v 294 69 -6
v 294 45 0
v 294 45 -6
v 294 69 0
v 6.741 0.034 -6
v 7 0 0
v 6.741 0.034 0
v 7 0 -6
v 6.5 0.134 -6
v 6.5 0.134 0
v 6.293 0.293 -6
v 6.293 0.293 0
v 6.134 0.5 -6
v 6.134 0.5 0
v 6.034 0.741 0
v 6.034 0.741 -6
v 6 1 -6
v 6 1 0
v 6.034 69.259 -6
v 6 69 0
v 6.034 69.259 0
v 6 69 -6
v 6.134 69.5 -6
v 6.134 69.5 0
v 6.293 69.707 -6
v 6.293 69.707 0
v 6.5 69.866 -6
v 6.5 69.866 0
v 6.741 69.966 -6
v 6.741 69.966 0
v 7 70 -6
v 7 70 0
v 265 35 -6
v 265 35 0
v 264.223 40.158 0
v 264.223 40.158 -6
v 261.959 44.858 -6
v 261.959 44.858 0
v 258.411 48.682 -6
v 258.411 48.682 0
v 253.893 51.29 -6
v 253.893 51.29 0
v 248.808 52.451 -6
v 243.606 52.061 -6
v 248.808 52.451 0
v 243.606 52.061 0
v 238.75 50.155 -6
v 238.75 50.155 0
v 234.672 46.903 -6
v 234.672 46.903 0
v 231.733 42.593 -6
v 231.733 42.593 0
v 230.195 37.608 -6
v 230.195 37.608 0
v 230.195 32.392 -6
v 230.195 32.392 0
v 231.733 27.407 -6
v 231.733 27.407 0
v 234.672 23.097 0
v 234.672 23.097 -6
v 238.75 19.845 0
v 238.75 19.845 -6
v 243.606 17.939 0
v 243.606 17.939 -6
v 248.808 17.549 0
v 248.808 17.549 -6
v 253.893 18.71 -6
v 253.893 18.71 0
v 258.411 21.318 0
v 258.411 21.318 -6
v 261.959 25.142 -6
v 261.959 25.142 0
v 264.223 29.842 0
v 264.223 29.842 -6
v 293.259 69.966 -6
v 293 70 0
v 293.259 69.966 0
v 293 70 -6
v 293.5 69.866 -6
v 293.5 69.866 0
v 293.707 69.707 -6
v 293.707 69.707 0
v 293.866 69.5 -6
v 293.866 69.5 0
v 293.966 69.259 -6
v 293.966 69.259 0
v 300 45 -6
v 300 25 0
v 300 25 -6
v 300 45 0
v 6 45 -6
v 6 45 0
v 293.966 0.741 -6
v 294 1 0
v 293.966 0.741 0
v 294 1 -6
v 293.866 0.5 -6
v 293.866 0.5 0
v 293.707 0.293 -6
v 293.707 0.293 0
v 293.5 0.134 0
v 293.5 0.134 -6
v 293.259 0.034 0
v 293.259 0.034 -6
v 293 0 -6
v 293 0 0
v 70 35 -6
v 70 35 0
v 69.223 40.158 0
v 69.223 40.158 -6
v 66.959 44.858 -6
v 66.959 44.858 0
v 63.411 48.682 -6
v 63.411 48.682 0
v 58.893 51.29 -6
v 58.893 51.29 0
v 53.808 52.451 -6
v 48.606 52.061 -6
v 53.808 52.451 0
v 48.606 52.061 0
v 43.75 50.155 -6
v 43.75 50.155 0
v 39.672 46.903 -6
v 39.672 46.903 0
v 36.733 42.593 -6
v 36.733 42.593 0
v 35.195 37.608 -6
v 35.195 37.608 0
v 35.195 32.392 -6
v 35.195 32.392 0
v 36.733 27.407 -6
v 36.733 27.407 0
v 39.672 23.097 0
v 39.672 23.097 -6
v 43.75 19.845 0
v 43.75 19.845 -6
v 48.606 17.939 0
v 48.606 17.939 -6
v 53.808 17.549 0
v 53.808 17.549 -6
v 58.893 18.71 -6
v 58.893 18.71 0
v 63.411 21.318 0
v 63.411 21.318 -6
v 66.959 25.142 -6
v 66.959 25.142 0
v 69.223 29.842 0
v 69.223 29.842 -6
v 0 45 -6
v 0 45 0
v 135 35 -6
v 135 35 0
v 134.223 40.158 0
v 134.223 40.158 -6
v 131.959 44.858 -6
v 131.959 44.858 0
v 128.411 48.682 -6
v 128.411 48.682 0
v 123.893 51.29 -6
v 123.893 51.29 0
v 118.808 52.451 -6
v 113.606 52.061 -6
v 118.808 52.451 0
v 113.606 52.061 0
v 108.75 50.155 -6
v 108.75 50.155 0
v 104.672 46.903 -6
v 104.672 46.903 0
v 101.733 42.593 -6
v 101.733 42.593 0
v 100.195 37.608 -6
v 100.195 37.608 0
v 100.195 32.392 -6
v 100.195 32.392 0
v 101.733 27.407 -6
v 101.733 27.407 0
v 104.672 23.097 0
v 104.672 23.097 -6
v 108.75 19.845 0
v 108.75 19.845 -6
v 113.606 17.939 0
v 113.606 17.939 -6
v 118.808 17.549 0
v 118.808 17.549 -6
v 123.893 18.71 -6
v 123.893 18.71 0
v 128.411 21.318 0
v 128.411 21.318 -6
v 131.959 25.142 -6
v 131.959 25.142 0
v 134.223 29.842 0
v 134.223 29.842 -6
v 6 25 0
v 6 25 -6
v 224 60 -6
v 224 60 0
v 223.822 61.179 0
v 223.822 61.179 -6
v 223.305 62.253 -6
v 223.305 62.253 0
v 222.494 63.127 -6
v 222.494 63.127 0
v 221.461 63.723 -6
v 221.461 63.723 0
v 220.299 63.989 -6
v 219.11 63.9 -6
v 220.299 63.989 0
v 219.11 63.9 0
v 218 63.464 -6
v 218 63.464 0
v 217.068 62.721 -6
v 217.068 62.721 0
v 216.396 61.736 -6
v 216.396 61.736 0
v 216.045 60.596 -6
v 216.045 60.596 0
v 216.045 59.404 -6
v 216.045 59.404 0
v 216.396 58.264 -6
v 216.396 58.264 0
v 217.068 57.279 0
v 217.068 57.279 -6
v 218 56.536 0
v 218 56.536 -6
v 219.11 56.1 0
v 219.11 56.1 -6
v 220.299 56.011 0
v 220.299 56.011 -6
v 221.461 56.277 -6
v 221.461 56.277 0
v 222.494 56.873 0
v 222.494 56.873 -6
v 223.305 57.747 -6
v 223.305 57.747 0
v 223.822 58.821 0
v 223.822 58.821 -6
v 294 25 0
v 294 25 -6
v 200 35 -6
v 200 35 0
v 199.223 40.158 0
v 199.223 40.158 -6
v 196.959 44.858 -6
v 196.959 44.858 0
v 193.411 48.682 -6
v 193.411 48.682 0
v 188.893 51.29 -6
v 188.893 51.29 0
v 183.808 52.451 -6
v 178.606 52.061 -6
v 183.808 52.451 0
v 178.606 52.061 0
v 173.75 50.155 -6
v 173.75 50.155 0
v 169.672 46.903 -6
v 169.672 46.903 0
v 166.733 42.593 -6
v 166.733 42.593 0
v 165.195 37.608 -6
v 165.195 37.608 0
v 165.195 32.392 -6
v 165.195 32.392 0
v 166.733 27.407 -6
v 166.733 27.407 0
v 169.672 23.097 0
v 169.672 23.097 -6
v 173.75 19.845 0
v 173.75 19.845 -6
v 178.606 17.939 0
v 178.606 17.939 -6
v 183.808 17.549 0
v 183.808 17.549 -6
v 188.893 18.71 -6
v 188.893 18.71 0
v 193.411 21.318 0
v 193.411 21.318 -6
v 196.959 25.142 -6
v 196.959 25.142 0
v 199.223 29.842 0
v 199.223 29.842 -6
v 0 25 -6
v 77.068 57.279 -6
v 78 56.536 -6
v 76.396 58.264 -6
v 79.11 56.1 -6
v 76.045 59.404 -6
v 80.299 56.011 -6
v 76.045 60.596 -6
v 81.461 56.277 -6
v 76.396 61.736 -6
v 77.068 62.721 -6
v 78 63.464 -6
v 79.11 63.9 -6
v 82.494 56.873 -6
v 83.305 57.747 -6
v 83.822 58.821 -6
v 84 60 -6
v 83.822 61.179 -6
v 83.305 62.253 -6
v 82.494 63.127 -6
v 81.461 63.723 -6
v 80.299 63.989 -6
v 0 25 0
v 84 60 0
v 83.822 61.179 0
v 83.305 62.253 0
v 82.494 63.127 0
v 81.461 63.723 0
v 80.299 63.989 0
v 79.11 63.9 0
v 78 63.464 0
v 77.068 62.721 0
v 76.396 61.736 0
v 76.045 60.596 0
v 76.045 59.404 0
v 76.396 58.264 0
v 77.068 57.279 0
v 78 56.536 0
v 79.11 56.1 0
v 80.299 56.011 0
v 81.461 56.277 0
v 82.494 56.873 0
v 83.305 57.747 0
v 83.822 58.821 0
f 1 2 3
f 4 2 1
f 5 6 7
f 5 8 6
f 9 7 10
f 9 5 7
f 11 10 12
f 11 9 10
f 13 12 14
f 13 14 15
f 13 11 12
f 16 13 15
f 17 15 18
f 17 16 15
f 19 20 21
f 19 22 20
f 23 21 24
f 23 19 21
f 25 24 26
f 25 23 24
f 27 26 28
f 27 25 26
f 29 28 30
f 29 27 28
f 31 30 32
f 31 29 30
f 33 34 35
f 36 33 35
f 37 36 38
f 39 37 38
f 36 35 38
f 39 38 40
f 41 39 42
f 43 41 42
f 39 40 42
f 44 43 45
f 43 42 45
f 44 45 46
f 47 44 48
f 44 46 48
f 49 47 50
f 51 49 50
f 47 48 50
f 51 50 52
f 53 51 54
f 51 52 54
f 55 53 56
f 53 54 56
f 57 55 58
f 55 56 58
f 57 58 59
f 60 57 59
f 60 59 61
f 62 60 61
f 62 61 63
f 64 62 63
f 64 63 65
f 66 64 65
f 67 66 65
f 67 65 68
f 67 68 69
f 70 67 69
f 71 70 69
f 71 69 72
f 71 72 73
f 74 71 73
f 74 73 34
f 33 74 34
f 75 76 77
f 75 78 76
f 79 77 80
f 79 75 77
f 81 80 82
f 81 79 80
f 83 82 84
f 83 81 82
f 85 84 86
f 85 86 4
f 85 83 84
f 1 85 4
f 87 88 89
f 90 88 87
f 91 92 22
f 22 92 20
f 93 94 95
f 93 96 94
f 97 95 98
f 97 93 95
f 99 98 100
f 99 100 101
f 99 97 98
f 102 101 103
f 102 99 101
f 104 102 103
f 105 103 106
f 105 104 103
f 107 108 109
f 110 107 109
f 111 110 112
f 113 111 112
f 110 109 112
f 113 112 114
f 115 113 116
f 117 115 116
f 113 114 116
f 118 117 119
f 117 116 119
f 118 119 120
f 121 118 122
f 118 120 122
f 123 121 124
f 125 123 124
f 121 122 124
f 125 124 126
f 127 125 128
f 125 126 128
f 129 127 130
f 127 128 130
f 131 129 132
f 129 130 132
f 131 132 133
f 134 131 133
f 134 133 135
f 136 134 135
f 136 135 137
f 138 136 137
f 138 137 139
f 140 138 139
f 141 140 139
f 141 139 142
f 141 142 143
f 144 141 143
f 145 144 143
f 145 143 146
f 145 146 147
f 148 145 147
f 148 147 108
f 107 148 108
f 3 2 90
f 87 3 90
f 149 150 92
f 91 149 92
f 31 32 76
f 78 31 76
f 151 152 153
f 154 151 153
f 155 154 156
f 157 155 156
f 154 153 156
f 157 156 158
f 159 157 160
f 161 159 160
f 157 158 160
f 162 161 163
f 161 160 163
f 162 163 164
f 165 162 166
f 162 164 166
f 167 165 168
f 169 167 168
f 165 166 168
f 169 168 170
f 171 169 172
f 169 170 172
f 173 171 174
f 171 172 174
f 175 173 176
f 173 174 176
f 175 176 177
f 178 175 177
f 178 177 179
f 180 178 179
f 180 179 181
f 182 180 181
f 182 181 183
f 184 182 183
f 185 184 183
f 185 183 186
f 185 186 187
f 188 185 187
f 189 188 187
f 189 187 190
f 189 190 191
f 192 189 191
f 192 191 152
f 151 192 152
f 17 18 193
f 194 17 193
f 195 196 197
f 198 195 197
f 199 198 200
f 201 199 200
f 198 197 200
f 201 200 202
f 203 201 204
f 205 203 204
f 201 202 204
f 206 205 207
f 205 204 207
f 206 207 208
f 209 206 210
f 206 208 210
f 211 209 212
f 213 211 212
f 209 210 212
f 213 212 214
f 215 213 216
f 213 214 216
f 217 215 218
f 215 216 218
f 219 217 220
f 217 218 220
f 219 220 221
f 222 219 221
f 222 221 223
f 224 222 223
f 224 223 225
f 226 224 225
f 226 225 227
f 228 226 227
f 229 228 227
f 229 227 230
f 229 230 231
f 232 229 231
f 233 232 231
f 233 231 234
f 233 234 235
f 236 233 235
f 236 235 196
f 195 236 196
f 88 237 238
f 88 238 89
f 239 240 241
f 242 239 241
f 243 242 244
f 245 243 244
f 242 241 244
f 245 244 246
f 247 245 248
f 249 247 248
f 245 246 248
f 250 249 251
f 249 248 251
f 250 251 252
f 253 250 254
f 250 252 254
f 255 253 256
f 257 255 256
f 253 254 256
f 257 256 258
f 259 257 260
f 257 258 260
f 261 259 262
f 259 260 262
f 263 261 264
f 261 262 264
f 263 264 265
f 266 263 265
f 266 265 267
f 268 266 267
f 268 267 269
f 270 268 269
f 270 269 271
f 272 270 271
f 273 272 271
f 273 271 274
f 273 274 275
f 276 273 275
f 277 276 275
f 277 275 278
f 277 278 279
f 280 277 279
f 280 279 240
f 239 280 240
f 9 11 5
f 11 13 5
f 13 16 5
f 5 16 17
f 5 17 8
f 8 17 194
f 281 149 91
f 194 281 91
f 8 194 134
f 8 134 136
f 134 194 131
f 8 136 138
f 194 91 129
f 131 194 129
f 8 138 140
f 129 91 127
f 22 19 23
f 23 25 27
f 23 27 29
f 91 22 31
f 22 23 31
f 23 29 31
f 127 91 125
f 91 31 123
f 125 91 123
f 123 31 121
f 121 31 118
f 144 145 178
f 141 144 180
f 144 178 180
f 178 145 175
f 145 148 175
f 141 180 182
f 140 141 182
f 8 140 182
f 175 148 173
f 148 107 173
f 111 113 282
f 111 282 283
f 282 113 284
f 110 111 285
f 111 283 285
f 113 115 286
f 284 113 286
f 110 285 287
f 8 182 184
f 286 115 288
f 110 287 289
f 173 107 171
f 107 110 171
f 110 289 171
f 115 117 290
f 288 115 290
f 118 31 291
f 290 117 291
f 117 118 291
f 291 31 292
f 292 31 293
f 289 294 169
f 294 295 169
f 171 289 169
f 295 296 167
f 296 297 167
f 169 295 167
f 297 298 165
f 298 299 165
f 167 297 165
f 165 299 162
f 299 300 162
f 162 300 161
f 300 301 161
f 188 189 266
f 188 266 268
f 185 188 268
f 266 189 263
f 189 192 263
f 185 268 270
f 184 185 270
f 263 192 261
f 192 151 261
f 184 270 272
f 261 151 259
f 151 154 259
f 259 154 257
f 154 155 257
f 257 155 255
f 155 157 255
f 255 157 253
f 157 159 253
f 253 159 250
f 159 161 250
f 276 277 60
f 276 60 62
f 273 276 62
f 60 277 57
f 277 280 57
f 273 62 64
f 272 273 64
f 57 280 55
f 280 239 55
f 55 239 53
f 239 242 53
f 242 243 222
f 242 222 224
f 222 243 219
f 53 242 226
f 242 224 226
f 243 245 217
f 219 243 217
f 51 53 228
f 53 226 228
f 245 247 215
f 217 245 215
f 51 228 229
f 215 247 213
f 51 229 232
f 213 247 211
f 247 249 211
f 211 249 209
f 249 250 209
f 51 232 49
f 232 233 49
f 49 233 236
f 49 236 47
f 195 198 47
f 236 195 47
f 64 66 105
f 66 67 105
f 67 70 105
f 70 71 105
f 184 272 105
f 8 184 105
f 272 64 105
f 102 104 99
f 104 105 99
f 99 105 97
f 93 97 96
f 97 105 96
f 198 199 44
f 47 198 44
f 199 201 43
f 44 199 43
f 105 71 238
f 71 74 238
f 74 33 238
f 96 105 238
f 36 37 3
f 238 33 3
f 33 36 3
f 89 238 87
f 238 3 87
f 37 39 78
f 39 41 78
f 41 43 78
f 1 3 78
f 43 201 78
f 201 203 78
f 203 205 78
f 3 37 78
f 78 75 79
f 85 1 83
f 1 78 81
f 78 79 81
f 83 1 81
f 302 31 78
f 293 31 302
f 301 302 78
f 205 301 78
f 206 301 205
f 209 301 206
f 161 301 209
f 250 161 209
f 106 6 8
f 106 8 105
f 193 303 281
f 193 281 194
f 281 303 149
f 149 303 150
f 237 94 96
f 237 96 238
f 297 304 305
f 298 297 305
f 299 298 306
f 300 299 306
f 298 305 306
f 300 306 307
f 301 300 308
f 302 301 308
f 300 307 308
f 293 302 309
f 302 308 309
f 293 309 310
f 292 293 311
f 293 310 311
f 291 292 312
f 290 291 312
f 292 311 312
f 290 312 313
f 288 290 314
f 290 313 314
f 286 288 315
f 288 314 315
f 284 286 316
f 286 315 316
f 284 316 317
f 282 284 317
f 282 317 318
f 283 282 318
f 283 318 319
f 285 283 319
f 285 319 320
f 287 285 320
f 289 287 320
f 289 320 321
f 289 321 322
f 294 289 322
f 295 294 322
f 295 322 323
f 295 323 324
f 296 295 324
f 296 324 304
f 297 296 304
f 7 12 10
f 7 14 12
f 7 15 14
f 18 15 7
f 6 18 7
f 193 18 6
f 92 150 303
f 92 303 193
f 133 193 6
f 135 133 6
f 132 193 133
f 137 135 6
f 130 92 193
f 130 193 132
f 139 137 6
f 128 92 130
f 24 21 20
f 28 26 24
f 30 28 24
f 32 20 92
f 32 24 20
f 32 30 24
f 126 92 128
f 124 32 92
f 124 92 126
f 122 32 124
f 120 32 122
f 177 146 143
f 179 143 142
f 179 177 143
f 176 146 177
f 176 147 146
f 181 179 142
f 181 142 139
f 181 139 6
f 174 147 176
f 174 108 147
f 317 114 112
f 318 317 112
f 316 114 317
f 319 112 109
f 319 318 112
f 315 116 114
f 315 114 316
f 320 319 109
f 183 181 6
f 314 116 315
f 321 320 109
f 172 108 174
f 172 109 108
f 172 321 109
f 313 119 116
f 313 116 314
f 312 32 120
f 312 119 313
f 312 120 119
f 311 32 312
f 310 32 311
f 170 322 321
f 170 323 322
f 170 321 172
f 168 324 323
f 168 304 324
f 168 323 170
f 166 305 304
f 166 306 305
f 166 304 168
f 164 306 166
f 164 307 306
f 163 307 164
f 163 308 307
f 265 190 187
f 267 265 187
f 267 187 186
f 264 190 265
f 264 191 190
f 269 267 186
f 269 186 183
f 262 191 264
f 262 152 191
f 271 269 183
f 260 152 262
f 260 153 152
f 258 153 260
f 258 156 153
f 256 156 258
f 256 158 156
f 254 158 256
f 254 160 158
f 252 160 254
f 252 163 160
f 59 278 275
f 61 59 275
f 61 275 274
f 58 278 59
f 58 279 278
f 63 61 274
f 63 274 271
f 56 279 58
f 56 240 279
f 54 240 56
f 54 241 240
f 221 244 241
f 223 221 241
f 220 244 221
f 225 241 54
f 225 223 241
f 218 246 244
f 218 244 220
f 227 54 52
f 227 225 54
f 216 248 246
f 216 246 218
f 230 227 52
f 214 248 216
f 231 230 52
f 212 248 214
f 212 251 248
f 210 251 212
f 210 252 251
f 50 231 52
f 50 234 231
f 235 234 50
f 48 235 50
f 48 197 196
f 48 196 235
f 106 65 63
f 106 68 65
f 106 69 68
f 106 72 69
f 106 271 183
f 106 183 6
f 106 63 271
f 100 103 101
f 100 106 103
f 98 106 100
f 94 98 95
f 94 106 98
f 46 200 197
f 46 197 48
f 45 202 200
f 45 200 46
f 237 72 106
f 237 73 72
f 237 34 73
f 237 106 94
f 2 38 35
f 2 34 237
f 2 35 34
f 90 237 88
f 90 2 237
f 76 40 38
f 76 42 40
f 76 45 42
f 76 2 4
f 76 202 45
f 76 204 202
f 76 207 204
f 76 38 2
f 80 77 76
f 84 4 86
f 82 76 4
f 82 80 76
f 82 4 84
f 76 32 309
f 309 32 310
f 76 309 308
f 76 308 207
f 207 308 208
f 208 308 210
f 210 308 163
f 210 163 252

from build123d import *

# Parameters (mm, degrees)
SKETCH1_W   = 300
SKETCH1_H   = 70
FRONT_DEPTH = 6
SKETCH2_W   = 6
SKETCH2_H   = 25
SKETCH2_R   = 4
MOUNT_DEPTH = 309.116860947
FILLET_2_R  = 1
SKETCH3_R   = 17.5
LITE_DEPTH  = 309.116860947


with BuildPart() as part:
    # Sketch1 → front (new body)
    with BuildSketch(Plane.XY):
        with Locations((150, 35)):
            Rectangle(SKETCH1_W, SKETCH1_H)
    extrude(amount=-FRONT_DEPTH)

    # Sketch2 → mount (cut, through all)
    with BuildSketch(Plane.XY):
        with Locations((3, 57.5)):
            Rectangle(SKETCH2_W, SKETCH2_H)
        with Locations((3, 12.5)):
            Rectangle(SKETCH2_W, SKETCH2_H)
        with Locations((297, 57.5)):
            Rectangle(SKETCH2_W, SKETCH2_H)
        with Locations((297, 12.5)):
            Rectangle(SKETCH2_W, SKETCH2_H)
        with Locations((80, 60)):
            Circle(SKETCH2_R)
        with Locations((220, 60)):
            Circle(SKETCH2_R)
    extrude(amount=-MOUNT_DEPTH, mode=Mode.SUBTRACT)

    # fillet 2
    fillet_2_edges = [part.edges().sort_by_distance(p)[0] for p in [
        (6, 70, -3),
        (6, 0, -3),
        (294, 70, -3),
        (294, 0, -3),
    ]]
    fillet(fillet_2_edges, radius=FILLET_2_R)

    # Sketch3 → lite (cut, through all)
    with BuildSketch(Plane.XY):
        with Locations((52.5, 35)):
            Circle(SKETCH3_R)
        with Locations((117.5, 35)):
            Circle(SKETCH3_R)
        with Locations((182.5, 35)):
            Circle(SKETCH3_R)
        with Locations((247.5, 35)):
            Circle(SKETCH3_R)
    extrude(amount=-LITE_DEPTH, mode=Mode.SUBTRACT)


solid = part.part
